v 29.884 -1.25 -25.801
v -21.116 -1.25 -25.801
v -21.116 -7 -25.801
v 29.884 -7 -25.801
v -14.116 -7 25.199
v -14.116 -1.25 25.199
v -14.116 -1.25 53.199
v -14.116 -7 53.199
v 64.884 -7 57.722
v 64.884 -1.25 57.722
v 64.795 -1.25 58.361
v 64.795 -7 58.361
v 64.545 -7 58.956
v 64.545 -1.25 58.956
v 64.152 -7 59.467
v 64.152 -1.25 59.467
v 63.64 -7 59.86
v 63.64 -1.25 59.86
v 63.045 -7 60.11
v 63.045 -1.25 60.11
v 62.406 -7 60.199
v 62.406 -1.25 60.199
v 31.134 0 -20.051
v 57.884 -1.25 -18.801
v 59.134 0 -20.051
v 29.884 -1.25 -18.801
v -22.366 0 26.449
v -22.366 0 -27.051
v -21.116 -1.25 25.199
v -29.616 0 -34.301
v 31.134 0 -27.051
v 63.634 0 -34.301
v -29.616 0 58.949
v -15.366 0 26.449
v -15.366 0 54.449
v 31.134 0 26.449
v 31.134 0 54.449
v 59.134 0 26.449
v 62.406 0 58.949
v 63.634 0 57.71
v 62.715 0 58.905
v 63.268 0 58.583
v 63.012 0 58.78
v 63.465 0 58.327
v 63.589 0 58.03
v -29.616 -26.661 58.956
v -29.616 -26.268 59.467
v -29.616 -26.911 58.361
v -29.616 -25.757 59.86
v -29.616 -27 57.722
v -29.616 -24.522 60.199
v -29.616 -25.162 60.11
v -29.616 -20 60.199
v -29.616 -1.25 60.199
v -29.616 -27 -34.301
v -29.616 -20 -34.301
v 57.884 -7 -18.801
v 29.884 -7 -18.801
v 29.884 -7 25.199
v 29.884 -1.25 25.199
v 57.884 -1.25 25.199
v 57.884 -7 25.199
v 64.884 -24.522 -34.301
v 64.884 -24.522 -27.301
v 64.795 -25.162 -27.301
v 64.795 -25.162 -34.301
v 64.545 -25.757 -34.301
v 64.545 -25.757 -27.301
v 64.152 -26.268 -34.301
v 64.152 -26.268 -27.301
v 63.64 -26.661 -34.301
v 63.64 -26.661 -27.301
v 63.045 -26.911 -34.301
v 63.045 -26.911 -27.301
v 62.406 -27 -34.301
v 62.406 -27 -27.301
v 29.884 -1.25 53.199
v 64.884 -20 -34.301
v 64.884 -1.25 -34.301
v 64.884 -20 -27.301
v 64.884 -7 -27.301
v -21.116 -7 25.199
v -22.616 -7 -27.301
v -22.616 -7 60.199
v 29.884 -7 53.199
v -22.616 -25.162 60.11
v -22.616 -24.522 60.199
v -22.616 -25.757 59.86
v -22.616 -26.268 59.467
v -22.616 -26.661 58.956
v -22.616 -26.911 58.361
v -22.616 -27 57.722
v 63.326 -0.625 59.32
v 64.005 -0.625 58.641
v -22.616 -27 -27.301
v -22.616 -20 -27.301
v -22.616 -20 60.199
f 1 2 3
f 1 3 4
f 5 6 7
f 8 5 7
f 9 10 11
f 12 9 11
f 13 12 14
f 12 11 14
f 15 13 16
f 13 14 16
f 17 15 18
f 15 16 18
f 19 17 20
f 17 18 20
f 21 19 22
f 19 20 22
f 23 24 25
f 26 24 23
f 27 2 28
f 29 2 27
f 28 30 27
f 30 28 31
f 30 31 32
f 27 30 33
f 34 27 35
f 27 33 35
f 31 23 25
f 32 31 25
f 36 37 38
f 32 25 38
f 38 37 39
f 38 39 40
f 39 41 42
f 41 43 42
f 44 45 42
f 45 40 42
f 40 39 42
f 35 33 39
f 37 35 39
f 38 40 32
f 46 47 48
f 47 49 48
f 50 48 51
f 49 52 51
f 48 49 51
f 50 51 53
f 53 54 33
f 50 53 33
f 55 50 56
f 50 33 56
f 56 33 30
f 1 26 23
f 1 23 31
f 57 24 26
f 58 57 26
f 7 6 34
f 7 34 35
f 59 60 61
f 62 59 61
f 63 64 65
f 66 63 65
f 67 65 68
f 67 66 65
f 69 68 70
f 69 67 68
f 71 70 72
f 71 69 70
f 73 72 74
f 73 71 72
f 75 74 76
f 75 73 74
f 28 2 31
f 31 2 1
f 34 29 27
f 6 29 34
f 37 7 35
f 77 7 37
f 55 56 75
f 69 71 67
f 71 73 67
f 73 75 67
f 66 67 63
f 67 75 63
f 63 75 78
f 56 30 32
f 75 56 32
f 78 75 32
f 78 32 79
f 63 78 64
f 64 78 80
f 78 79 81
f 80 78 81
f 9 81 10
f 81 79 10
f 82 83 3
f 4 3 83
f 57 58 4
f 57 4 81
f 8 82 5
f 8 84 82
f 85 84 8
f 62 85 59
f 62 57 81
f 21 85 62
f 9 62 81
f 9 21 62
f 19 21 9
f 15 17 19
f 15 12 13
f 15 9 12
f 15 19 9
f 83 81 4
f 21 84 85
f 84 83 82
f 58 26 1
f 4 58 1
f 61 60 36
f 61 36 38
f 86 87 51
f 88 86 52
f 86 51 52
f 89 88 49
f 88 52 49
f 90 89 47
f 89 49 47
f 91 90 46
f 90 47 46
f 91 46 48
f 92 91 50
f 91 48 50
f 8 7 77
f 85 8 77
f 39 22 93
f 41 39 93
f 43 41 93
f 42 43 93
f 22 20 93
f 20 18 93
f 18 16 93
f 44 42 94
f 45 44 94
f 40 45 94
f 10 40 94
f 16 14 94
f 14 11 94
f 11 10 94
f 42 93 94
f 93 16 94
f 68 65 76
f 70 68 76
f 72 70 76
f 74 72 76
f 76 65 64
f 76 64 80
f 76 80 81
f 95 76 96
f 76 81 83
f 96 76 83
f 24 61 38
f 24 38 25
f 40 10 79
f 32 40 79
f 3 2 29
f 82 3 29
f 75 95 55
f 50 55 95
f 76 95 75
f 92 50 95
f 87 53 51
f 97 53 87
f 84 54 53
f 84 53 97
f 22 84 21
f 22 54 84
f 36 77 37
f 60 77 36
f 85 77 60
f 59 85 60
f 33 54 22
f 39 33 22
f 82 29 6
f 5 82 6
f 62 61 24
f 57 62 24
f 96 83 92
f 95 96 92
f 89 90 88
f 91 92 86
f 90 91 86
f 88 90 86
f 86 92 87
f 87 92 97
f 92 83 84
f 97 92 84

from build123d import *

# Parameters (mm, degrees)
F0_W        = 7
F0_H        = 7
F0_W_2      = 35
F0_H_2      = 52.5
F0_H_3      = 35
F1_DEPTH    = 20
F0_W_3      = 51
F0_H_4      = 1.5
F2_DEPTH    = 7
F3_T1_DEPTH = 19.49950001
F3_T3_DEPTH = 19.49950001
F3_T5_DEPTH = 19.49950001
F4_SIZE     = 1.25


# Not quite as in the source:
# - a fillet or chamfer that OpenCascade refuses, or shapes differently, is made with other operations: its cross-section is extruded or revolved along the edge and cut away or added


with BuildPart() as f1:
    # F0 (on Front) → F1 (new body)
    with BuildSketch(Plane.XZ):
        with Locations((-26.1161934872, -30.8009498573)):
            Rectangle(F0_W, F0_H)
        with Locations((47.3838065128, -30.8009498573)):
            Rectangle(F0_W_2, F0_H)
        with Locations((-26.1161934872, -1.0509498573)):
            Rectangle(F0_W, F0_H_2)
        Polygon((-21.1161934872, -27.3009498573), (-22.6161934872, -27.3009498573), (-22.6161934872, -34.3009498573), (29.8838065128, -34.3009498573), (29.8838065128, -27.3009498573), align=None)
        with Locations((-26.1161934872, 42.6990501427)):
            Rectangle(F0_W, F0_H_3)
    extrude(amount=F1_DEPTH)

    # F0 (on Front) + F1_face (on face) → F2 (join)
    with BuildSketch(Plane.XZ):
        Polygon((-22.6161934872, 60.1990501427), (-22.6161934872, 25.1990501427), (-21.1161934872, 25.1990501427), (-14.1161934872, 25.1990501427), (-14.1161934872, 53.1990501427), (29.8838065128, 53.1990501427), (29.8838065128, 60.1990501427), align=None)
        Polygon((-21.1161934872, -27.3009498573), (-22.6161934872, -27.3009498573), (-22.6161934872, -34.3009498573), (29.8838065128, -34.3009498573), (29.8838065128, -27.3009498573), align=None)
        with Locations((-26.1161934872, 42.6990501427)):
            Rectangle(F0_W, F0_H_3)
        with Locations((-26.1161934872, -1.0509498573)):
            Rectangle(F0_W, F0_H_2)
        Polygon((29.8838065128, -18.8009498573), (29.8838065128, -25.8009498573), (29.8838065128, -27.3009498573), (64.8838065128, -27.3009498573), (64.8838065128, 25.1990501427), (57.8838065128, 25.1990501427), (57.8838065128, -18.8009498573), align=None)
        with Locations((-26.1161934872, -30.8009498573)):
            Rectangle(F0_W, F0_H)
        Polygon((64.8838065128, 60.1990501427), (29.8838065128, 60.1990501427), (29.8838065128, 53.1990501427), (29.8838065128, 25.1990501427), (57.8838065128, 25.1990501427), (64.8838065128, 25.1990501427), align=None)
        with Locations((47.3838065128, -30.8009498573)):
            Rectangle(F0_W_2, F0_H)
        Polygon((-21.1161934872, 25.1990501427), (-22.6161934872, 25.1990501427), (-22.6161934872, -27.3009498573), (-21.1161934872, -27.3009498573), (-21.1161934872, -25.8009498573), align=None)
        with Locations((4.3838065128, -26.5509498573)):
            Rectangle(F0_W_3, F0_H_4)
    with BuildSketch(Plane(origin=(-3.3998473333, -20, -8.0846037034), x_dir=(1, 0, 0), z_dir=(0, -1, 0))):
        Polygon((-26.2163461538, -26.2163461538), (68.2836538462, -26.2163461538), (68.2836538462, -19.2163461538), (-19.2163461538, -19.2163461538), (-19.2163461538, 68.2836538462), (-26.2163461538, 68.2836538462), align=None)
    extrude(amount=F2_DEPTH)

    # F3: fillet of radius 2.5 on 3 edges, made by hand

    # F3_s2 → F3_t1 (cut)
    with BuildSketch(Plane.YZ.offset(-35.8659434922)):
        with BuildLine():
            ThreePointArc((-24.5001, 60.1991501427), (-26.267866953, 59.4669170957), (-27.0001, 57.6991501427))
            Line((-27.0001, 57.6991501427), (-27.0501, 57.6991501427))
            ThreePointArc((-27.0501, 57.6991501427), (-27.05, 58.9491001427), (-27.05, 60.1990501427))
            Line((-27.05, 60.1990501427), (-27, 60.2490501427))
            ThreePointArc((-27, 60.2490501427), (-25.75005, 60.2490501427), (-24.5001, 60.2491501427))
            Line((-24.5001, 60.2491501427), (-24.5001, 60.1991501427))
        make_face()
    extrude(amount=F3_T1_DEPTH, mode=Mode.SUBTRACT)

    # F3_s4 → F3_t3 (cut)
    with BuildSketch(Plane.XY.offset(-40.5506998623)):
        with BuildLine():
            ThreePointArc((64.8839065128, -24.5001), (64.1516734658, -26.267866953), (62.3839065128, -27.0001))
            Line((62.3839065128, -27.0001), (62.3839065128, -27.0501))
            ThreePointArc((62.3839065128, -27.0501), (63.6338565128, -27.05), (64.8838065128, -27.05))
            Line((64.8838065128, -27.05), (64.9338065128, -27))
            ThreePointArc((64.9338065128, -27), (64.9338065128, -25.75005), (64.9339065128, -24.5001))
            Line((64.9339065128, -24.5001), (64.8839065128, -24.5001))
        make_face()
    extrude(amount=F3_T3_DEPTH, mode=Mode.SUBTRACT)

    # F3_s6 → F3_t5 (cut)
    with BuildSketch(Plane.XZ.offset(-6.249750005)):
        with BuildLine():
            ThreePointArc((64.8839065128, 57.6991501427), (64.1516734658, 59.4669170957), (62.3839065128, 60.1991501427))
            Line((62.3839065128, 60.1991501427), (62.3839065128, 60.2491501427))
            ThreePointArc((62.3839065128, 60.2491501427), (63.6338565128, 60.2490501427), (64.8838065128, 60.2490501427))
            Line((64.8838065128, 60.2490501427), (64.9338065128, 60.1990501427))
            ThreePointArc((64.9338065128, 60.1990501427), (64.9338065128, 58.9491001427), (64.9339065128, 57.6991501427))
            Line((64.9339065128, 57.6991501427), (64.8839065128, 57.6991501427))
        make_face()
    extrude(amount=F3_T5_DEPTH, mode=Mode.SUBTRACT)

    # F4
    f4_edges = [f1.edges().sort_by_distance(p)[0] for p in [
        (43.883807, 0, 25.19905),
        (57.883807, 0, 3.19905),
        (43.883807, 0, -18.80095),
        (29.883807, 0, -22.30095),
        (4.383807, 0, -25.80095),
        (-21.116193, 0, -0.30095),
        (29.883807, 0, 39.19905),
        (7.883807, 0, 53.19905),
        (-14.116193, 0, 39.19905),
        (-17.616193, 0, 25.19905),
        (64.883807, 0, 11.71028),
        (16.395037, 0, 60.19905),
        (64.151673, 0, 59.466917),
    ]]
    chamfer(f4_edges, length=F4_SIZE)


solid = f1.part
